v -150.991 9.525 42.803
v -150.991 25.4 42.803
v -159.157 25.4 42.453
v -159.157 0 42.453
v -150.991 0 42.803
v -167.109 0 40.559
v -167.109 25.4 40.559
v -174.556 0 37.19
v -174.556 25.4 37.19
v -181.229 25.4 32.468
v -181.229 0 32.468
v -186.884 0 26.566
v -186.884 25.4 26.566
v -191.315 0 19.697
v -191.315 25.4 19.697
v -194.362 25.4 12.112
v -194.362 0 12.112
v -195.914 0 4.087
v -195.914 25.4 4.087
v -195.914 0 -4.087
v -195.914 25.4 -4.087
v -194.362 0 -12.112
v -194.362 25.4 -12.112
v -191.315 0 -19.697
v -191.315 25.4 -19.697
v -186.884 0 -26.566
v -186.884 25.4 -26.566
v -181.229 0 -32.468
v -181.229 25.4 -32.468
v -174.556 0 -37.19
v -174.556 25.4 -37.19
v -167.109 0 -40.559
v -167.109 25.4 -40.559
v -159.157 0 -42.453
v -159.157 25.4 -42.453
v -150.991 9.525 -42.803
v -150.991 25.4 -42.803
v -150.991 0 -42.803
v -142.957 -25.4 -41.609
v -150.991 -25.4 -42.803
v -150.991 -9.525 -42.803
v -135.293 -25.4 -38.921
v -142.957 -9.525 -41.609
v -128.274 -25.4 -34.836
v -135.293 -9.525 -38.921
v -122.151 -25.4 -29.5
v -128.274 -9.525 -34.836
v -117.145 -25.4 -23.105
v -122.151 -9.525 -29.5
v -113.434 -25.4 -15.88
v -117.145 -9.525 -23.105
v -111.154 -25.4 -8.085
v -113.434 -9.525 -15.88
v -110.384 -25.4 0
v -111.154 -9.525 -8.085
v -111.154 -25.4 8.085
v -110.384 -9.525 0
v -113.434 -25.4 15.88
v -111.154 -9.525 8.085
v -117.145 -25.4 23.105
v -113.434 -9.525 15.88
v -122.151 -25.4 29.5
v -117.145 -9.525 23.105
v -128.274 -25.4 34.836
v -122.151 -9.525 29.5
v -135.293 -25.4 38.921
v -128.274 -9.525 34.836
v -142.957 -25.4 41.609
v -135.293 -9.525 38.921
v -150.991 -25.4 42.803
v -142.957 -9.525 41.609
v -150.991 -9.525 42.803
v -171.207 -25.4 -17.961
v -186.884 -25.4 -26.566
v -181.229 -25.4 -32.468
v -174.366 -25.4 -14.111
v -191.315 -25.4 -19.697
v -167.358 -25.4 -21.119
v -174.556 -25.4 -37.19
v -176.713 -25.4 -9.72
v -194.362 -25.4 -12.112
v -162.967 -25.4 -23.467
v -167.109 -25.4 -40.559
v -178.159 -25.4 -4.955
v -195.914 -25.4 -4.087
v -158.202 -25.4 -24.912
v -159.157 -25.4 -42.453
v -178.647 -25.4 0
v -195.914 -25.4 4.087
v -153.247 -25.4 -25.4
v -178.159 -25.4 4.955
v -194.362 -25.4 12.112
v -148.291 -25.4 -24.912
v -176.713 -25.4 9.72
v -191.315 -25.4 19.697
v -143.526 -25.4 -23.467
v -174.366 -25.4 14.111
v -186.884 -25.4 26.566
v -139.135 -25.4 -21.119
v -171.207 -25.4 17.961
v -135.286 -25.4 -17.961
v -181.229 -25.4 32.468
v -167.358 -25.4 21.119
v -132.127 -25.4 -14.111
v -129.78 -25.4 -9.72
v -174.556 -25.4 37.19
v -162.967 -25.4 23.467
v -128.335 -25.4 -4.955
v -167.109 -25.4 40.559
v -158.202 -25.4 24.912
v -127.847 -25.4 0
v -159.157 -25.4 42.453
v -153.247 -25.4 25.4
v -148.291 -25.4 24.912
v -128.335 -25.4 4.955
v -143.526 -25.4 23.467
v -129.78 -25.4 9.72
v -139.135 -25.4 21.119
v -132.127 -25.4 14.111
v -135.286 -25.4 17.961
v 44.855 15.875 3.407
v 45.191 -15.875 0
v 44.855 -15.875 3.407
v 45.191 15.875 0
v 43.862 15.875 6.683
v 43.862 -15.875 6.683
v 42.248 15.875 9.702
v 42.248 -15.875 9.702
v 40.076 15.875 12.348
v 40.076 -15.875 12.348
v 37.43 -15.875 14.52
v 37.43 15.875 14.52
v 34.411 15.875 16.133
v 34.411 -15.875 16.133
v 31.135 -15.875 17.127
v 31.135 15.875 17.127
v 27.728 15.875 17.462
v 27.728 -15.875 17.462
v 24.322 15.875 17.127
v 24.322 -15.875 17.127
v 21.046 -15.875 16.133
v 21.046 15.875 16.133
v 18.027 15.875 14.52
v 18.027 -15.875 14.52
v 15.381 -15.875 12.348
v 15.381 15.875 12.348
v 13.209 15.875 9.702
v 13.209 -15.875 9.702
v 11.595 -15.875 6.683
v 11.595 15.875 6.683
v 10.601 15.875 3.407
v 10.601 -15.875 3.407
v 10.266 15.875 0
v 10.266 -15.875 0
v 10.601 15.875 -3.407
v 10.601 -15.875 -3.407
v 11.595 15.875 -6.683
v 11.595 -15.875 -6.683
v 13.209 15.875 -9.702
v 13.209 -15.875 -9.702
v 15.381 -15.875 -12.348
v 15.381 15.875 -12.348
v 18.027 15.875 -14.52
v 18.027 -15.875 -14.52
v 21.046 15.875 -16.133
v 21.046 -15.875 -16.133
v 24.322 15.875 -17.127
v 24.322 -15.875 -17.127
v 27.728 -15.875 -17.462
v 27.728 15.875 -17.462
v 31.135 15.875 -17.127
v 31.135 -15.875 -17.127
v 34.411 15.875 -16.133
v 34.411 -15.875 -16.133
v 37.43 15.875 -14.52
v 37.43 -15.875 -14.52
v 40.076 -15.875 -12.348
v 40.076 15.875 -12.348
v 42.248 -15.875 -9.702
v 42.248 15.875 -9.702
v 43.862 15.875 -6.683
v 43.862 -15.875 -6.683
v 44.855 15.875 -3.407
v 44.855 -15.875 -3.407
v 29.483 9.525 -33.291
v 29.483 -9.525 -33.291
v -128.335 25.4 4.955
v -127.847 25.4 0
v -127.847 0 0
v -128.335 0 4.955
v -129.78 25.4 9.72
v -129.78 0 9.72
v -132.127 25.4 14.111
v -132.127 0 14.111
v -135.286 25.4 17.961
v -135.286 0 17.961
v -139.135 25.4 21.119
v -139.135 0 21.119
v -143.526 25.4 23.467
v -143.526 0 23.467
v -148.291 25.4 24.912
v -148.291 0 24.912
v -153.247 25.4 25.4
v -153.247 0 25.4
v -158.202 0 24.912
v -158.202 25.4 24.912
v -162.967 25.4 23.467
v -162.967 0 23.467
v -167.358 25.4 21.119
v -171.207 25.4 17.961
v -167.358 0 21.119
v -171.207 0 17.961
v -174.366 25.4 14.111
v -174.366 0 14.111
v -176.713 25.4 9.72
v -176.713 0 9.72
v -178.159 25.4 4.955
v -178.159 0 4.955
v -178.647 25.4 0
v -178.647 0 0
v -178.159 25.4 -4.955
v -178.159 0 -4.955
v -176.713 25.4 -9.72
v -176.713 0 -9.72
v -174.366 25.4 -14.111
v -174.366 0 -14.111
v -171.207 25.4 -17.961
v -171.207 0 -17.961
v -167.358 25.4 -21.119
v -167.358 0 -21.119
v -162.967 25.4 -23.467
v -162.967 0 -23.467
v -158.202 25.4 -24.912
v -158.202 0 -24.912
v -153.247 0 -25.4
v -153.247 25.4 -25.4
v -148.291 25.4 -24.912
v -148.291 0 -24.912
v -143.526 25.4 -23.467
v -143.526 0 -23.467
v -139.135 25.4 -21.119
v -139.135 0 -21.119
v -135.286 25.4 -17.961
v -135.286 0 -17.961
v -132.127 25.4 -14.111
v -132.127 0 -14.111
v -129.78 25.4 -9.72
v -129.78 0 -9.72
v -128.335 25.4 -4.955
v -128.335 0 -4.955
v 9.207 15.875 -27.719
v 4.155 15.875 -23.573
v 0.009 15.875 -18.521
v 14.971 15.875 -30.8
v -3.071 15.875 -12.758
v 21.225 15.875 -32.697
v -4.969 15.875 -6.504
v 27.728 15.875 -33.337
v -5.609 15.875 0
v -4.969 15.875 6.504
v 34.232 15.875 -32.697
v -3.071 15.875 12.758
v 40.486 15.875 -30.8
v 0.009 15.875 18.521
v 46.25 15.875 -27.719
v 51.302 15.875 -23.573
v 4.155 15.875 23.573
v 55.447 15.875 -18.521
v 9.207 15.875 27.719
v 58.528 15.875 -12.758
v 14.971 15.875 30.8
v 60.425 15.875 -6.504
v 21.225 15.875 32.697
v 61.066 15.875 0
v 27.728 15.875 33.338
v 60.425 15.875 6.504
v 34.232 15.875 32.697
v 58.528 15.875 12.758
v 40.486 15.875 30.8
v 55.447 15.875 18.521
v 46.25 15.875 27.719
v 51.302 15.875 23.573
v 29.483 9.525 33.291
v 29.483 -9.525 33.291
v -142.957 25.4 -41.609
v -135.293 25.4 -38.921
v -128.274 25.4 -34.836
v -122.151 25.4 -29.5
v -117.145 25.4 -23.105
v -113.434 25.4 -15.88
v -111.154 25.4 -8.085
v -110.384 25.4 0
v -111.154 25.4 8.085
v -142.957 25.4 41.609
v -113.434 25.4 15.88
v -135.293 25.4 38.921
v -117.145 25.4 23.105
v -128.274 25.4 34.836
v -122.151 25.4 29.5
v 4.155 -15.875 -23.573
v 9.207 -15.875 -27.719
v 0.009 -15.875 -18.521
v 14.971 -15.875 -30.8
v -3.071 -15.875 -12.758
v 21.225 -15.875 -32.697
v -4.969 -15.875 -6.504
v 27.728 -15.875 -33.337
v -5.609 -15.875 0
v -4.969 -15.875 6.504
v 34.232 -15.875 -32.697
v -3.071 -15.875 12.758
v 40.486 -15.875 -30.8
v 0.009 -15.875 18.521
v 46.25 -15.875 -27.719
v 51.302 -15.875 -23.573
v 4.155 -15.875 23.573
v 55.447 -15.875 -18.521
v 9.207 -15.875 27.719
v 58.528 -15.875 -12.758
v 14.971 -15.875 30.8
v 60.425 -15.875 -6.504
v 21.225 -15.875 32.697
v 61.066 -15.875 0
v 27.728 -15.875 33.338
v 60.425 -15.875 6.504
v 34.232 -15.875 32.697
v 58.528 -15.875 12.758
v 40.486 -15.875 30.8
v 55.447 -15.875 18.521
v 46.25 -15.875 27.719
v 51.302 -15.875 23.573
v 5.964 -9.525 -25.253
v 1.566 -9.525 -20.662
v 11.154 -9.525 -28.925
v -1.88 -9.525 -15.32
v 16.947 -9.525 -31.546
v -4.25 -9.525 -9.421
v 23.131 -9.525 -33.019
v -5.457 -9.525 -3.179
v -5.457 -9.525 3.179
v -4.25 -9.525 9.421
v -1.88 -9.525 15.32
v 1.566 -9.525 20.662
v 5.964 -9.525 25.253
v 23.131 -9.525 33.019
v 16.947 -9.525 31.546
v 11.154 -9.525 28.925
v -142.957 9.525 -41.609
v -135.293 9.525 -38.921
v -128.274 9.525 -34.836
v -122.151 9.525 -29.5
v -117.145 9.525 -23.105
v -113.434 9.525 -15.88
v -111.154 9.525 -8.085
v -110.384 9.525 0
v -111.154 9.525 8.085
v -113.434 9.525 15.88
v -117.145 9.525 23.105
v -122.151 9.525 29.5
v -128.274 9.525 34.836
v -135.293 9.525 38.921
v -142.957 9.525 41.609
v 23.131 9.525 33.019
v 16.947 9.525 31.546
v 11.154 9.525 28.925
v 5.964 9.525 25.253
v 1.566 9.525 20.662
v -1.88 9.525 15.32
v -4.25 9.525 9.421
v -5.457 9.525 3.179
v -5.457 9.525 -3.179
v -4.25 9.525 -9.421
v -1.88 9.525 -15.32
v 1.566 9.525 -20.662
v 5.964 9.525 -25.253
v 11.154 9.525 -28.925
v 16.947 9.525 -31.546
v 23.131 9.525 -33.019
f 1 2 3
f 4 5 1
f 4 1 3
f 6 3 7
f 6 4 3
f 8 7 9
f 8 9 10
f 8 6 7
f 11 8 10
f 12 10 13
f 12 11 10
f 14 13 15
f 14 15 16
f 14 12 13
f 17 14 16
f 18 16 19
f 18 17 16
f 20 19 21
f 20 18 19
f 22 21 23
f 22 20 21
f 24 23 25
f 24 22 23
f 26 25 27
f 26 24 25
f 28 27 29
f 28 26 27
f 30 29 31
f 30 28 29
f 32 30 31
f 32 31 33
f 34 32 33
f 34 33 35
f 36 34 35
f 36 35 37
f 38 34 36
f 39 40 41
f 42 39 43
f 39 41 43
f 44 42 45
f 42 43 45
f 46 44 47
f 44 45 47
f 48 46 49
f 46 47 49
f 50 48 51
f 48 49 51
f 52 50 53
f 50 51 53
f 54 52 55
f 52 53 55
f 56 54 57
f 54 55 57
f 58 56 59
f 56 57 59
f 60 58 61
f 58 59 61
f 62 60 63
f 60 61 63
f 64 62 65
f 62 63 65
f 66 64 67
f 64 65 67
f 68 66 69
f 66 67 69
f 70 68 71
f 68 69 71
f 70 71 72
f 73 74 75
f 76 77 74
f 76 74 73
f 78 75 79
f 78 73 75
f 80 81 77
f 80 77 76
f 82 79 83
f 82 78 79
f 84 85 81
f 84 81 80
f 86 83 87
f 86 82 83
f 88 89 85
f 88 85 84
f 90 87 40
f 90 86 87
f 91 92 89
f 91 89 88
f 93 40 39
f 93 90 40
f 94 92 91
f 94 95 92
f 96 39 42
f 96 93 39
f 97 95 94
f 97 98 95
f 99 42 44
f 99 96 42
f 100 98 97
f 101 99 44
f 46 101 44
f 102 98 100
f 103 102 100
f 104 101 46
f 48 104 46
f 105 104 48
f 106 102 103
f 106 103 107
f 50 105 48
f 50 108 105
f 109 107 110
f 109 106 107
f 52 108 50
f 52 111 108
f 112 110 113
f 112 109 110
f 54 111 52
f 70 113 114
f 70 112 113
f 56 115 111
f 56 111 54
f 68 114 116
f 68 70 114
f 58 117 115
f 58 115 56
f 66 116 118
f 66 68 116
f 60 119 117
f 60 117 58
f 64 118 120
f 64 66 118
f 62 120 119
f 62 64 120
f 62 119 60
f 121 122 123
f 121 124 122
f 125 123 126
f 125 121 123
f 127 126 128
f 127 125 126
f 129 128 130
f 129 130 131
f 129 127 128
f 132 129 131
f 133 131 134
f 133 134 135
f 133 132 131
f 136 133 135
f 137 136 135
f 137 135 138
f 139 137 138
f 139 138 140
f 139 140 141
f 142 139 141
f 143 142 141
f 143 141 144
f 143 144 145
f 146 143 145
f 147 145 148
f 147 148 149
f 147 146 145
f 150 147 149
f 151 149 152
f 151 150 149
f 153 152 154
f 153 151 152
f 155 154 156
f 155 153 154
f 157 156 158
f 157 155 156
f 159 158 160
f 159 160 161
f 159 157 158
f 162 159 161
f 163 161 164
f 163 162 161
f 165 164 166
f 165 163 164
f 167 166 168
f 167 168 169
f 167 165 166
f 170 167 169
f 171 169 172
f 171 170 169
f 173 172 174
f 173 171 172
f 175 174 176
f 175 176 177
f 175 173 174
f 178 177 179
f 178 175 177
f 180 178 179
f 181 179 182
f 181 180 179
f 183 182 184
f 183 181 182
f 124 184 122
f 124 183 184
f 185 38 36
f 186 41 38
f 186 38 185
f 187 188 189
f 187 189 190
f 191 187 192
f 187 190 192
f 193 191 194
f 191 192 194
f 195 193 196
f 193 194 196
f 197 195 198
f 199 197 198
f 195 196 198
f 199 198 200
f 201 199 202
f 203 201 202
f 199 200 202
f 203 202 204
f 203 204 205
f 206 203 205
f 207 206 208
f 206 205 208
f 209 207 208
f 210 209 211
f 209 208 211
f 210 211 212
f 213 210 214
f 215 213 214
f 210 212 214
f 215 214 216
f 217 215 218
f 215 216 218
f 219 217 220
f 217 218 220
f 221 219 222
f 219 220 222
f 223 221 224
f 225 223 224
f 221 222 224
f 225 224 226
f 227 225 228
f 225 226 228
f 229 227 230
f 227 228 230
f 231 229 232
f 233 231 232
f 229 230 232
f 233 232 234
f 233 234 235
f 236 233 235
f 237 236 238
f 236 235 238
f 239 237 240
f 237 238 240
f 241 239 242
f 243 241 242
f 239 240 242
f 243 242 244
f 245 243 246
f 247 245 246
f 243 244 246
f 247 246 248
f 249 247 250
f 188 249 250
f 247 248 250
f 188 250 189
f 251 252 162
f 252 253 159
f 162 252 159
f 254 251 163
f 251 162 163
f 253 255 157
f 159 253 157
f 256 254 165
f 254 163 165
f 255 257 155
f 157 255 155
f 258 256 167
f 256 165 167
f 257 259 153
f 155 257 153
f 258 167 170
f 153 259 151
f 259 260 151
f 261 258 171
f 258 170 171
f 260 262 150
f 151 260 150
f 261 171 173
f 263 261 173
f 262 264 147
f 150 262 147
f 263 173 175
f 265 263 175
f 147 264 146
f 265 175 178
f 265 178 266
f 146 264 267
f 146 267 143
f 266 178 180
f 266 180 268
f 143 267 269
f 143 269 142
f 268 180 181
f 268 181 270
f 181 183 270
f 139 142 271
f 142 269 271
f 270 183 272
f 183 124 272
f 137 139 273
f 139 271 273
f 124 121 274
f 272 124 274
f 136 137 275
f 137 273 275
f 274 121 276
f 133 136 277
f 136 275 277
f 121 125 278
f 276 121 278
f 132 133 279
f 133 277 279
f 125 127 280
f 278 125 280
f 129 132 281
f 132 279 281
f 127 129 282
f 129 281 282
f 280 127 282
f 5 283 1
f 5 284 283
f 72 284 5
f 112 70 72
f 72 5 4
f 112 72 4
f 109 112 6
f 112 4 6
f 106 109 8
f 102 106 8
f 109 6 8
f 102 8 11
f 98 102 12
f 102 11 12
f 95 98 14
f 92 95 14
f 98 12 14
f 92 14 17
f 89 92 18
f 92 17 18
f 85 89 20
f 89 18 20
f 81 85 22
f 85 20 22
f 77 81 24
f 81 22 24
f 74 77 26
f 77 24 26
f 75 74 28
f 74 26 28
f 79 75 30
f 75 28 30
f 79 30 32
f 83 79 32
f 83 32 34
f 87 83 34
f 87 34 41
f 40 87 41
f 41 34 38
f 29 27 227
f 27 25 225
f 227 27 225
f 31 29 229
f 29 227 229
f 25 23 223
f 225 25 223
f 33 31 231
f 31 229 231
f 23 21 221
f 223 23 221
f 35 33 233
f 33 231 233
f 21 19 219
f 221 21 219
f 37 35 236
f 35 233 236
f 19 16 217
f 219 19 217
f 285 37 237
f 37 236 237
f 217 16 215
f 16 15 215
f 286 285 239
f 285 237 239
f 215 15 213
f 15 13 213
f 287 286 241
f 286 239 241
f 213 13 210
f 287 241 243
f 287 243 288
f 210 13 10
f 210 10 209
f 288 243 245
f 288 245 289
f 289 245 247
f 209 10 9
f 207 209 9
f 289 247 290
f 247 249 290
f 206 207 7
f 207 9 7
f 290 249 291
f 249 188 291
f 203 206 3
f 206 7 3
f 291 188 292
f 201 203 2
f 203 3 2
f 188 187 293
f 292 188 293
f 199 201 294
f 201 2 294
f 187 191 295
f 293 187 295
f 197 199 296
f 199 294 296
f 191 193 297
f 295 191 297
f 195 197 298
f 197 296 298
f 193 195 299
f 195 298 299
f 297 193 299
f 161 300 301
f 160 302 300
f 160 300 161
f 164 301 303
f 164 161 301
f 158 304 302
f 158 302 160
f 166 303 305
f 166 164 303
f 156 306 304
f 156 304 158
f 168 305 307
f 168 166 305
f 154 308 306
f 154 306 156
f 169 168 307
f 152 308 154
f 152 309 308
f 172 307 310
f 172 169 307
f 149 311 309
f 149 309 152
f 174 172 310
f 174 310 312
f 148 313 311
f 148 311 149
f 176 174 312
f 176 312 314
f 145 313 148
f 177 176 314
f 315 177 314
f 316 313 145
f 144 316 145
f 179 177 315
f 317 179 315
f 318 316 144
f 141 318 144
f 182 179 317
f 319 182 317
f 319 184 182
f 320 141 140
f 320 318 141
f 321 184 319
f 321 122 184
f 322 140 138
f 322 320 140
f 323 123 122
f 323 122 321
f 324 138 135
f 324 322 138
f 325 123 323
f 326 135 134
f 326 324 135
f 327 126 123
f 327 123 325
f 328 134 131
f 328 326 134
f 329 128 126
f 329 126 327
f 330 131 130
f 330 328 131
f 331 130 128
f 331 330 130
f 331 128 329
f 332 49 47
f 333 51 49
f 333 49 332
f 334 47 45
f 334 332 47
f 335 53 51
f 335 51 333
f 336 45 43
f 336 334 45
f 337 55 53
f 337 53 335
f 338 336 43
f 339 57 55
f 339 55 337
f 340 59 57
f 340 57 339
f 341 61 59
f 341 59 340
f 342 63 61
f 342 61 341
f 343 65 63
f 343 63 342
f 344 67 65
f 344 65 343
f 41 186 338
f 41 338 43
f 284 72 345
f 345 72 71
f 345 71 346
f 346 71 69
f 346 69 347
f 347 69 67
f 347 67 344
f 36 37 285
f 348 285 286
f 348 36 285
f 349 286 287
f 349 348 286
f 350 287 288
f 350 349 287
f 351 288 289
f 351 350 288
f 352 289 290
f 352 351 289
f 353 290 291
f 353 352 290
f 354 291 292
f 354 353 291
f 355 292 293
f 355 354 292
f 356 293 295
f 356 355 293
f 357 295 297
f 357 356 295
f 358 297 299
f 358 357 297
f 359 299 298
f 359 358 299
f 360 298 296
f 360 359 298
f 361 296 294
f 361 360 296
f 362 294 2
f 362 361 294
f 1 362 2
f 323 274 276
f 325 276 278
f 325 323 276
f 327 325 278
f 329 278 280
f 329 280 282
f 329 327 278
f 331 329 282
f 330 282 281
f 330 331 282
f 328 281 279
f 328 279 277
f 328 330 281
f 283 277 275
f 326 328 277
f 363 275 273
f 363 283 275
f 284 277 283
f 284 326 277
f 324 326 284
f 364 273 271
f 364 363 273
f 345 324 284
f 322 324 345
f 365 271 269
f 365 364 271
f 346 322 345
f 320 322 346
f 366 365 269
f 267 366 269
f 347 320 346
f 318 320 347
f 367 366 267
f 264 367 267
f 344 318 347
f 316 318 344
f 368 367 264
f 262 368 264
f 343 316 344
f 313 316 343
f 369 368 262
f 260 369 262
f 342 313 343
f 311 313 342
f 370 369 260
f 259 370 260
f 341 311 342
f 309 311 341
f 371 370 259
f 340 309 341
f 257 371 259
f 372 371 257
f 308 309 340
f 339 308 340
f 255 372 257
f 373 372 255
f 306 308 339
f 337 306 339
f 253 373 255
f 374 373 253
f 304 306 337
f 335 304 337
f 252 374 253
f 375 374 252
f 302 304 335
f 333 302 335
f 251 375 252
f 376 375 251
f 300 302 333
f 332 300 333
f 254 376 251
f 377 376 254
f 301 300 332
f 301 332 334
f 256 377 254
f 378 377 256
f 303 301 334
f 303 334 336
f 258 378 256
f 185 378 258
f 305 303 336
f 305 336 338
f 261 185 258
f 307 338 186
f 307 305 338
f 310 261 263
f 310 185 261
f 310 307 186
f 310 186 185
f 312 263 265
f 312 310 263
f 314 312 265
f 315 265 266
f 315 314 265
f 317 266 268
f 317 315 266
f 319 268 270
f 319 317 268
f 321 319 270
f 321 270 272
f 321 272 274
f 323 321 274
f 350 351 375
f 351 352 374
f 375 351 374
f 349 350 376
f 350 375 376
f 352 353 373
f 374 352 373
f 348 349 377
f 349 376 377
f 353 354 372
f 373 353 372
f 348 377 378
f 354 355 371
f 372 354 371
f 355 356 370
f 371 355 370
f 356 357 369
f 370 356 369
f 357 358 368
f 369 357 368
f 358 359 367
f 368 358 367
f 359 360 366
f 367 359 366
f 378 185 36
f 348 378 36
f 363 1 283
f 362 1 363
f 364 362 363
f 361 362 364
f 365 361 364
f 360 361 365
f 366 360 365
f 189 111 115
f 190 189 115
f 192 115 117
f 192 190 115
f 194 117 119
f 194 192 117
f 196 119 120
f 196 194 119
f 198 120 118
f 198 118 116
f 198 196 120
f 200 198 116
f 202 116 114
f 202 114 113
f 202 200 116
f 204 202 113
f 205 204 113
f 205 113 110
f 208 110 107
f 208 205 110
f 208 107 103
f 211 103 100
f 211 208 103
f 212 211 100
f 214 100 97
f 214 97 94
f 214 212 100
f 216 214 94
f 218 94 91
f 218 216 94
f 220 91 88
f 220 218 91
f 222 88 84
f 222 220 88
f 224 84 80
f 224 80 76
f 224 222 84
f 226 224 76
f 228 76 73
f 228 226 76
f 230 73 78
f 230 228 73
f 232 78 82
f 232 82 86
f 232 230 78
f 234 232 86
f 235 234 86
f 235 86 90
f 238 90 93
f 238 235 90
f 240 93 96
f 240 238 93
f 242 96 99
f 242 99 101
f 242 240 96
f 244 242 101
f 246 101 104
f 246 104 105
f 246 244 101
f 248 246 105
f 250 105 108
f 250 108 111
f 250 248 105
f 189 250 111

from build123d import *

# Parameters (mm, degrees)
F1_DEPTH = 9.525
F0_R     = 17.4625
F2_DEPTH = 15.875
F0_R_2   = 25.4
F3_DEPTH = 25.4


with BuildPart() as f1:
    # F0 (on Front) → F1 (new body, symmetric)
    with BuildSketch(Plane.XZ):
        with BuildLine():
            ThreePointArc((-150.9907119117, 42.803092487), (-122.150907194, 29.4999956791), (-110.3841329643, 0))
            ThreePointArc((-110.3841329643, 0), (-122.150907194, -29.4999956791), (-150.9907119117, -42.803092487))
            Line((-150.9907119117, -42.803092487), (29.4829722989, -33.2912941566))
            ThreePointArc((29.4829722989, -33.2912941566), (-5.6091329643, 0), (29.4829722989, 33.2912941566))
            Line((29.4829722989, 33.2912941566), (-150.9907119117, 42.803092487))
        make_face()
    extrude(amount=F1_DEPTH, both=True)

    # F0 (on Front) → F2 (join, symmetric)
    with BuildSketch(Plane.XZ):
        with BuildLine():
            ThreePointArc((61.0658670357, 0), (51.9139315238, 22.9444410837), (29.4829722989, 33.2912941566))
            ThreePointArc((29.4829722989, 33.2912941566), (-5.6091329643, 0), (29.4829722989, -33.2912941566))
            ThreePointArc((29.4829722989, -33.2912941566), (51.9139315238, -22.9444410837), (61.0658670357, 0))
        make_face()
        with Locations((27.7283670357, 0)):
            Circle(F0_R, mode=Mode.SUBTRACT)
    extrude(amount=F2_DEPTH, both=True)

    # F0 (on Front) → F3 (join, symmetric)
    with BuildSketch(Plane.XZ):
        with BuildLine():
            ThreePointArc((-150.9907119117, -42.803092487), (-122.150907194, -29.4999956791), (-110.3841329643, 0))
            ThreePointArc((-110.3841329643, 0), (-122.150907194, 29.4999956791), (-150.9907119117, 42.803092487))
            ThreePointArc((-150.9907119117, 42.803092487), (-196.1091329643, 0), (-150.9907119117, -42.803092487))
        make_face()
        with Locations((-153.2466329643, 0)):
            Circle(F0_R_2, mode=Mode.SUBTRACT)
    extrude(amount=F3_DEPTH, both=True)


solid = f1.part
